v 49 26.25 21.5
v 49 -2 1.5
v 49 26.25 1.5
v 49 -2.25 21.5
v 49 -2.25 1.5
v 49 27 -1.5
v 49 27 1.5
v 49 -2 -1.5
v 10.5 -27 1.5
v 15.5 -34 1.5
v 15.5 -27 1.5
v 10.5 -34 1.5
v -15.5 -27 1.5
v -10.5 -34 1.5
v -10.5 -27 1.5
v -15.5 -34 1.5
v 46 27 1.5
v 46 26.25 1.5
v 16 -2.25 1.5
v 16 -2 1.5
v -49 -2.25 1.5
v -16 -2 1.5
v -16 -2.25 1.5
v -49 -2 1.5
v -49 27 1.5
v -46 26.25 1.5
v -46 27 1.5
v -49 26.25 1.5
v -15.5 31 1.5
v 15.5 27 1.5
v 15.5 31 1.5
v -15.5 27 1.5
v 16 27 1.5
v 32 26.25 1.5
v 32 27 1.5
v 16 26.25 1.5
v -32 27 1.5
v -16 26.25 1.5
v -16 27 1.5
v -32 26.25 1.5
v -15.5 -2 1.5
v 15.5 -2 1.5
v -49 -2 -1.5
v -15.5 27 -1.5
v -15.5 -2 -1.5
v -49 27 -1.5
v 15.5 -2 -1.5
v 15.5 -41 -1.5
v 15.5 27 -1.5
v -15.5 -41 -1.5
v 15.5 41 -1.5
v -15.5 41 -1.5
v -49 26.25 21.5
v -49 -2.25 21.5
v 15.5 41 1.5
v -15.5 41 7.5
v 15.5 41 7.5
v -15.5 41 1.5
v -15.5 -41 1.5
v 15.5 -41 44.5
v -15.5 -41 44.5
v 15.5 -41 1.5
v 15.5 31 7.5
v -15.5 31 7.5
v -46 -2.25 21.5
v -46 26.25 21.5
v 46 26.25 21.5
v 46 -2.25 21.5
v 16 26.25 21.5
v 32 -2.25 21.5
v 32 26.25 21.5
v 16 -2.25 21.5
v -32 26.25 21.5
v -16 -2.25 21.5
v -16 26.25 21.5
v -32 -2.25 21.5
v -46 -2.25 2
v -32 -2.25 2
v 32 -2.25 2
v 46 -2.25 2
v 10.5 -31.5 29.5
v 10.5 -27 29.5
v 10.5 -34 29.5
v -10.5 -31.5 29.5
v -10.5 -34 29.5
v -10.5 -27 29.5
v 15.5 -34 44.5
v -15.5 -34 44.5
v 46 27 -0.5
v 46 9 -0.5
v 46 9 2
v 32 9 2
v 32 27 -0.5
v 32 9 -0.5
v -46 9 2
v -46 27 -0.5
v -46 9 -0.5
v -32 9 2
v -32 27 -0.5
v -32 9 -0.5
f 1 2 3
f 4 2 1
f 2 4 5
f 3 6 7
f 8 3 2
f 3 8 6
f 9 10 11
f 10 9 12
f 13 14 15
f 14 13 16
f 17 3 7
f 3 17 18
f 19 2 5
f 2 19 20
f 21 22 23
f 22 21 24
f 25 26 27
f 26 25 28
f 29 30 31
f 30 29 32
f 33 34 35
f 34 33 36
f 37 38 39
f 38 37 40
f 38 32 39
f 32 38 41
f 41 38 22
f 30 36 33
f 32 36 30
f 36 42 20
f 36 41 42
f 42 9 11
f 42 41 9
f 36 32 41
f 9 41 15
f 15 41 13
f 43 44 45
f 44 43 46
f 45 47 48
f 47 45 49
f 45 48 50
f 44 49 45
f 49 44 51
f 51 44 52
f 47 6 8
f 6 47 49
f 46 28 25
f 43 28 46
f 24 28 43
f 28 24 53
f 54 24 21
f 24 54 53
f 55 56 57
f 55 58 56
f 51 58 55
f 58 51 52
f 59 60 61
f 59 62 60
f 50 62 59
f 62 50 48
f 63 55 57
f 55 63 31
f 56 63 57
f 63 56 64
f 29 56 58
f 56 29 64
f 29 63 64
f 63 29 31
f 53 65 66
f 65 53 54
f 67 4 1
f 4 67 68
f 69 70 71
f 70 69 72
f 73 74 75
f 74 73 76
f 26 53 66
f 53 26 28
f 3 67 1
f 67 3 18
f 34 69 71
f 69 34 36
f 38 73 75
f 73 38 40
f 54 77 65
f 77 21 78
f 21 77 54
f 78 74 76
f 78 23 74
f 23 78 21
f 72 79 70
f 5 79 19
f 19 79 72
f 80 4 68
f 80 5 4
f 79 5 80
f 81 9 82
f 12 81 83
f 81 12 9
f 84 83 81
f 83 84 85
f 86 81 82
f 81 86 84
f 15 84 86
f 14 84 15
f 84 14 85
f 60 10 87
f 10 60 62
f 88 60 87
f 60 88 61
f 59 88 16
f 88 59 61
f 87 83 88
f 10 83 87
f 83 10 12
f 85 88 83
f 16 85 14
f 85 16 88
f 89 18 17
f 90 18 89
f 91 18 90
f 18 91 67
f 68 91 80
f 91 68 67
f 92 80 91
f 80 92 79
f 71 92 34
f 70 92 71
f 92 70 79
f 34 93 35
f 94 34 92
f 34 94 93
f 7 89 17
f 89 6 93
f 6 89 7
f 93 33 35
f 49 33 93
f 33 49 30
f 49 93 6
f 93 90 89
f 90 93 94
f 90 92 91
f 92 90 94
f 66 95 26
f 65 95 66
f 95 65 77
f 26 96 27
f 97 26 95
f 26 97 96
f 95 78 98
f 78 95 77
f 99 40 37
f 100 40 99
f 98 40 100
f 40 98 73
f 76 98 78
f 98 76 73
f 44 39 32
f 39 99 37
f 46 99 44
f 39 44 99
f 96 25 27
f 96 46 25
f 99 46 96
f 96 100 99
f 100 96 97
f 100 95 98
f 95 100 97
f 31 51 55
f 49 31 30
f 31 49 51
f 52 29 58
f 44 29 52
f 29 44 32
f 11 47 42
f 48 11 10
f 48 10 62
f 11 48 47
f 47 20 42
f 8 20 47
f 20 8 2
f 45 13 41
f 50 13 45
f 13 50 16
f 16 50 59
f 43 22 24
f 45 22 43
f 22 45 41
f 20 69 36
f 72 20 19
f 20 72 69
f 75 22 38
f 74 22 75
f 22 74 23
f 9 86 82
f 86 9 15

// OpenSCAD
/* Hive13 SumoBot Chassis/Frame */ 

// The front plow takes up a depth of 16.
// Some space is used for linesensor screw holes ~14mm

max_w = 98;
max_d = 98 - 16;

batterypack_w = 63;
batterypack_h = 15;
batterypack_d = 49;

bpack2_w = 54;
bpack2_h = 11;
bpack2_d = 31;

micro_w = 70;
micro_h = 15; // We just go to the top of the shield
micro_d = 54;

frame_w = max_w;
frame_h = 3;
frame_d = max_d;

// tire + motor thickness ~30 
wheel_radius = 15.5;
wheel_thickness = 14;
motor_w =14;
motor_h = 54;
motor_d = 20;
lip_w = motor_w;
lip_h = 18;
lip_d = 25;
lip_dist_from_bottom_motor = 36;
tire_distance = 9;
offset_w =2;
wheel_position=10; 
clearance_ground=2;

tab_plow_d=10;// tab to connect to screw in with the plow
linesensor_spacing = 18;
linesensor_depth = 23;
frame_wheel_d = 36;
wheel_clearance = 17;
backwall_thickness = 15;

module baseframe() {
difference() {
union() {
cube([frame_w, frame_d, frame_h]);
// mounting tabs
translate(v=[(frame_w - bpack2_d) /2, frame_d, 0]) {
difference() {
cube([bpack2_d,10 , frame_h+6]);
translate(v=[5, 5, 0]) {
cylinder(r = 2, h=frame_h+6);
}
translate(v=[bpack2_d-5, 5, 0]) {
cylinder(r = 2, h=frame_h+6);
}
}
}
//translate(v=[frame_w-linesensor_spacing-10, frame_d, 0]) {
//difference() {
// cube([10, 10, frame_h]);
// translate(v=[5, 5, 0]) {
// cylinder(r = 2, h=frame_h);
// }
//}
// }
// Wheel/Motor holder block
difference() // subtract out overhangs and wire section
{//Motor holder both sides.....
translate(v = [0,frame_wheel_d+1,frame_h]) {
cube([frame_w, frame_d -(frame_wheel_d + linesensor_depth)-2,motor_d-1+offset_w]);// replace batterypack_h + bpack2_h + micro_h by motor_d -1
}
// Removes space over motors
// translate(v = [2,frame_wheel_d+1,frame_h +bpack2_h]) {
// cube([motor_w, frame_d -(frame_wheel_d + linesensor_depth-1), batterypack_h + micro_h]);
// }
//translate(v = [frame_w-motor_w-2,frame_wheel_d+1,frame_h +bpack2_h]) {
// cube([motor_w, frame_d -(frame_wheel_d + linesensor_depth-1), batterypack_h + micro_h]);
// }
// Remove area over batterypacks
translate(v = [(frame_w + batterypack_d) / 2, frame_d-batterypack_w, frame_h+bpack2_h+wheel_clearance]) {
rotate([0,0,90]) {
batterypack();
}
}

translate(v = [(frame_w + bpack2_d) /2,frame_d-bpack2_w,frame_h]) {
rotate([0,0,90]) {
//bpack2();
cube([bpack2_w, bpack2_d, bpack2_h+wheel_clearance]);
}
}
translate(v = [(frame_w - micro_d) / 2, frame_d-batterypack_w, frame_h+bpack2_h+batterypack_h+wheel_clearance]) {
cube([micro_d, batterypack_w, 40]);
}

}
// Backwall
translate(v=[(frame_w + bpack2_d+10) /2-bpack2_d,frame_d-bpack2_w-backwall_thickness-2,frame_h]) {
cube([bpack2_d-10, backwall_thickness, bpack2_h+wheel_clearance]);
}
// Backwall second piece
translate(v = [(frame_w + bpack2_d)/2-bpack2_d,10,frame_h]) {
cube([bpack2_d, 7, bpack2_h+micro_h+batterypack_h]);
}
} // union


// Remove linesensor area
translate(v = [0,frame_d-linesensor_depth,0]) {
cube([linesensor_spacing, linesensor_depth, frame_h]);
}
translate(v = [frame_w - linesensor_spacing,frame_d-linesensor_depth,0]) {
cube([linesensor_spacing, linesensor_depth, frame_h]);
}
// Remove tires
translate(v = [0,0,0]) {
cube([motor_w + wheel_thickness + 4, frame_wheel_d, frame_h]);
}
translate(v = [frame_w-motor_w-wheel_thickness-4,0,0]) {
cube([motor_w + wheel_thickness + 4, frame_wheel_d, frame_h]);
}
// Remove unneeded space in the back
translate(v =[(frame_w + bpack2_d-5) /2-bpack2_d,0,0]) {
cube([bpack2_d+10, 10, frame_h]);
}
// Remove a hole for power switch
translate(v = [frame_w-linesensor_spacing-15,frame_d-linesensor_depth,0]) {
cube([15, 23, frame_h]);
}
// This one is mainly for looks
translate(v = [linesensor_spacing,frame_d-linesensor_depth,0]) {
cube([15, 23, frame_h]);
}
// Remove the wheels
// Right Tire
translate(v = [max_w-2, 7,-motor_d+22+offset_w]) {
rotate(a = [270, 180, 0]) {
motor();
}
}
// Left Tire
translate(v = [2, 7, 22+offset_w]) {
rotate(a = [270, 0, 0]) {
motor();
}
}

} // difference
}

module batterypack() {
color([0, 127, 127, 255]) {
cube(size=[batterypack_d, batterypack_w, batterypack_h],center=true);
}
}

module bpack2() {
color([127,127,0,255]) {
cube([bpack2_w, bpack2_d, bpack2_h]);
}
}

module micro() {
cube([micro_w, micro_d, micro_h]);
}

module motor() {
color([0,0,0,255]) {
union() {
cube(size=[motor_w, motor_h, motor_d], center = true );
// Lip
translate(v = [0, lip_dist_from_bottom_motor-lip_h, 0]) {//[0, -(lip_d-motor_d)/2, lip_dist_from_bottom_motor]
cube(size=[lip_w, lip_h, lip_d],center=true);
}
// wheel
translate(v = [-motor_w,-(motor_h-wheel_position)/2,0]) {//[motor_w,motor_d/2,motor_d/2]
rotate(a = [0, 90, 0]) {
cylinder(r = wheel_radius, h = wheel_thickness, center=true);
}
}
}
}
}


//
//translate(v =[0,0,6]) {
//baseframe();
//}

// NEW START WITH CENTERED DESIGN //

difference(){
union(){
//frame
cube(size = [frame_w, frame_d, frame_h], center = true);
// tab to screw in the plow
translate(v=[0,(frame_d-tab_plow_d)/2,frame_h]){
cube(size = [bpack2_d,tab_plow_d , frame_h+6], center = true);
}
//motor holder
translate(v=[0,12,(motor_d+frame_h)/2]){
cube(size=[frame_w,motor_h-lip_h-wheel_radius-wheel_position+lip_h,motor_d], center=true);}// replace batterypack_h + bpack2_h + micro_h by motor_d -1
//Backwall for small battery
translate(v=[0,-(frame_d-backwall_thickness)/2,frame_h/2+(bpack2_h+wheel_clearance)/2]){
cube(size=[bpack2_d-10, backwall_thickness, bpack2_h+wheel_clearance], center=true);}
//Backwall for big battery
translate(v=[0,-(frame_d-7)/2,frame_h/2+(bpack2_h+wheel_clearance+batterypack_h)/2]){
cube(size=[bpack2_d, 7, bpack2_h+wheel_clearance+batterypack_h], center=true);}
}//union end
//start removing 
//motors
translate(v=[(frame_w-motor_w)/2-3,0,wheel_radius-frame_h/2-clearance_ground]){
rotate(a=[0,0,0]){
motor();}}
mirror ([1,0,0]) {
translate(v=[(frame_w-motor_w)/2-3,0,wheel_radius-frame_h/2-clearance_ground]){
rotate(a=[0,0,0]){
motor();}}}
//space in front of motors
translate(v=[(frame_w-(frame_w-bpack2_d)/2)/2,(frame_d-(frame_d-motor_h)/2)/2,0]){
cube(size=[(frame_w-bpack2_d)/2,(frame_d-motor_h)/2,frame_h], center=true);}
mirror ([1,0,0]) {
translate(v=[(frame_w-(frame_w-bpack2_d)/2)/2,(frame_d-(frame_d-motor_h)/2)/2,0]){
cube(size=[(frame_w-bpack2_d)/2,(frame_d-motor_h)/2,frame_h], center=true);}}
// space behind the motors
translate(v=[(frame_w-(frame_w-bpack2_d)/2)/2,-(frame_d/2-((frame_d/2)-2)/2),0]){
cube(size=[(frame_w-bpack2_d)/2,(frame_d/2)-2,frame_h], center=true);}
mirror ([1,0,0]) {
translate(v=[(frame_w-(frame_w-bpack2_d)/2)/2,-(frame_d/2-((frame_d/2)-2)/2),0]){
cube(size=[(frame_w-bpack2_d)/2,(frame_d/2)-2,frame_h], center=true);}}
// big battery
translate(v=[0,0,frame_h/2+(bpack2_h+micro_h+batterypack_h)/2+batterypack_h]){
batterypack();}
//center piece between wheels
translate(v=[0,0,frame_h/2+ (bpack2_h+wheel_clearance)/2]){
cube(size=[bpack2_d+1, bpack2_w, bpack2_h+wheel_clearance],center=true);}
}//difference end
















//****************** NOT USED**********************//

//max base
//cube([max_w, max_d, 1]);
/*
// Right Tire
translate(v = [max_w-2, 12, -1]) {//too close to axis
rotate(a = [250, 180, 0]) {
motor();
}
}
// Left Tire
translate(v = [2, 5, 22]) {
rotate(a = [290, 0, 0]) {
motor();
}
}

translate(v = [(frame_w + bpack2_d) /2,frame_d-bpack2_w,frame_h+6]) {
rotate([0,0,90]) {
bpack2();
}
}

translate(v = [(frame_w + batterypack_d) / 2, frame_d-batterypack_w, frame_h+6+bpack2_h+wheel_clearance]) {
rotate([0,0,90]) {
batterypack();
}
}


*/
